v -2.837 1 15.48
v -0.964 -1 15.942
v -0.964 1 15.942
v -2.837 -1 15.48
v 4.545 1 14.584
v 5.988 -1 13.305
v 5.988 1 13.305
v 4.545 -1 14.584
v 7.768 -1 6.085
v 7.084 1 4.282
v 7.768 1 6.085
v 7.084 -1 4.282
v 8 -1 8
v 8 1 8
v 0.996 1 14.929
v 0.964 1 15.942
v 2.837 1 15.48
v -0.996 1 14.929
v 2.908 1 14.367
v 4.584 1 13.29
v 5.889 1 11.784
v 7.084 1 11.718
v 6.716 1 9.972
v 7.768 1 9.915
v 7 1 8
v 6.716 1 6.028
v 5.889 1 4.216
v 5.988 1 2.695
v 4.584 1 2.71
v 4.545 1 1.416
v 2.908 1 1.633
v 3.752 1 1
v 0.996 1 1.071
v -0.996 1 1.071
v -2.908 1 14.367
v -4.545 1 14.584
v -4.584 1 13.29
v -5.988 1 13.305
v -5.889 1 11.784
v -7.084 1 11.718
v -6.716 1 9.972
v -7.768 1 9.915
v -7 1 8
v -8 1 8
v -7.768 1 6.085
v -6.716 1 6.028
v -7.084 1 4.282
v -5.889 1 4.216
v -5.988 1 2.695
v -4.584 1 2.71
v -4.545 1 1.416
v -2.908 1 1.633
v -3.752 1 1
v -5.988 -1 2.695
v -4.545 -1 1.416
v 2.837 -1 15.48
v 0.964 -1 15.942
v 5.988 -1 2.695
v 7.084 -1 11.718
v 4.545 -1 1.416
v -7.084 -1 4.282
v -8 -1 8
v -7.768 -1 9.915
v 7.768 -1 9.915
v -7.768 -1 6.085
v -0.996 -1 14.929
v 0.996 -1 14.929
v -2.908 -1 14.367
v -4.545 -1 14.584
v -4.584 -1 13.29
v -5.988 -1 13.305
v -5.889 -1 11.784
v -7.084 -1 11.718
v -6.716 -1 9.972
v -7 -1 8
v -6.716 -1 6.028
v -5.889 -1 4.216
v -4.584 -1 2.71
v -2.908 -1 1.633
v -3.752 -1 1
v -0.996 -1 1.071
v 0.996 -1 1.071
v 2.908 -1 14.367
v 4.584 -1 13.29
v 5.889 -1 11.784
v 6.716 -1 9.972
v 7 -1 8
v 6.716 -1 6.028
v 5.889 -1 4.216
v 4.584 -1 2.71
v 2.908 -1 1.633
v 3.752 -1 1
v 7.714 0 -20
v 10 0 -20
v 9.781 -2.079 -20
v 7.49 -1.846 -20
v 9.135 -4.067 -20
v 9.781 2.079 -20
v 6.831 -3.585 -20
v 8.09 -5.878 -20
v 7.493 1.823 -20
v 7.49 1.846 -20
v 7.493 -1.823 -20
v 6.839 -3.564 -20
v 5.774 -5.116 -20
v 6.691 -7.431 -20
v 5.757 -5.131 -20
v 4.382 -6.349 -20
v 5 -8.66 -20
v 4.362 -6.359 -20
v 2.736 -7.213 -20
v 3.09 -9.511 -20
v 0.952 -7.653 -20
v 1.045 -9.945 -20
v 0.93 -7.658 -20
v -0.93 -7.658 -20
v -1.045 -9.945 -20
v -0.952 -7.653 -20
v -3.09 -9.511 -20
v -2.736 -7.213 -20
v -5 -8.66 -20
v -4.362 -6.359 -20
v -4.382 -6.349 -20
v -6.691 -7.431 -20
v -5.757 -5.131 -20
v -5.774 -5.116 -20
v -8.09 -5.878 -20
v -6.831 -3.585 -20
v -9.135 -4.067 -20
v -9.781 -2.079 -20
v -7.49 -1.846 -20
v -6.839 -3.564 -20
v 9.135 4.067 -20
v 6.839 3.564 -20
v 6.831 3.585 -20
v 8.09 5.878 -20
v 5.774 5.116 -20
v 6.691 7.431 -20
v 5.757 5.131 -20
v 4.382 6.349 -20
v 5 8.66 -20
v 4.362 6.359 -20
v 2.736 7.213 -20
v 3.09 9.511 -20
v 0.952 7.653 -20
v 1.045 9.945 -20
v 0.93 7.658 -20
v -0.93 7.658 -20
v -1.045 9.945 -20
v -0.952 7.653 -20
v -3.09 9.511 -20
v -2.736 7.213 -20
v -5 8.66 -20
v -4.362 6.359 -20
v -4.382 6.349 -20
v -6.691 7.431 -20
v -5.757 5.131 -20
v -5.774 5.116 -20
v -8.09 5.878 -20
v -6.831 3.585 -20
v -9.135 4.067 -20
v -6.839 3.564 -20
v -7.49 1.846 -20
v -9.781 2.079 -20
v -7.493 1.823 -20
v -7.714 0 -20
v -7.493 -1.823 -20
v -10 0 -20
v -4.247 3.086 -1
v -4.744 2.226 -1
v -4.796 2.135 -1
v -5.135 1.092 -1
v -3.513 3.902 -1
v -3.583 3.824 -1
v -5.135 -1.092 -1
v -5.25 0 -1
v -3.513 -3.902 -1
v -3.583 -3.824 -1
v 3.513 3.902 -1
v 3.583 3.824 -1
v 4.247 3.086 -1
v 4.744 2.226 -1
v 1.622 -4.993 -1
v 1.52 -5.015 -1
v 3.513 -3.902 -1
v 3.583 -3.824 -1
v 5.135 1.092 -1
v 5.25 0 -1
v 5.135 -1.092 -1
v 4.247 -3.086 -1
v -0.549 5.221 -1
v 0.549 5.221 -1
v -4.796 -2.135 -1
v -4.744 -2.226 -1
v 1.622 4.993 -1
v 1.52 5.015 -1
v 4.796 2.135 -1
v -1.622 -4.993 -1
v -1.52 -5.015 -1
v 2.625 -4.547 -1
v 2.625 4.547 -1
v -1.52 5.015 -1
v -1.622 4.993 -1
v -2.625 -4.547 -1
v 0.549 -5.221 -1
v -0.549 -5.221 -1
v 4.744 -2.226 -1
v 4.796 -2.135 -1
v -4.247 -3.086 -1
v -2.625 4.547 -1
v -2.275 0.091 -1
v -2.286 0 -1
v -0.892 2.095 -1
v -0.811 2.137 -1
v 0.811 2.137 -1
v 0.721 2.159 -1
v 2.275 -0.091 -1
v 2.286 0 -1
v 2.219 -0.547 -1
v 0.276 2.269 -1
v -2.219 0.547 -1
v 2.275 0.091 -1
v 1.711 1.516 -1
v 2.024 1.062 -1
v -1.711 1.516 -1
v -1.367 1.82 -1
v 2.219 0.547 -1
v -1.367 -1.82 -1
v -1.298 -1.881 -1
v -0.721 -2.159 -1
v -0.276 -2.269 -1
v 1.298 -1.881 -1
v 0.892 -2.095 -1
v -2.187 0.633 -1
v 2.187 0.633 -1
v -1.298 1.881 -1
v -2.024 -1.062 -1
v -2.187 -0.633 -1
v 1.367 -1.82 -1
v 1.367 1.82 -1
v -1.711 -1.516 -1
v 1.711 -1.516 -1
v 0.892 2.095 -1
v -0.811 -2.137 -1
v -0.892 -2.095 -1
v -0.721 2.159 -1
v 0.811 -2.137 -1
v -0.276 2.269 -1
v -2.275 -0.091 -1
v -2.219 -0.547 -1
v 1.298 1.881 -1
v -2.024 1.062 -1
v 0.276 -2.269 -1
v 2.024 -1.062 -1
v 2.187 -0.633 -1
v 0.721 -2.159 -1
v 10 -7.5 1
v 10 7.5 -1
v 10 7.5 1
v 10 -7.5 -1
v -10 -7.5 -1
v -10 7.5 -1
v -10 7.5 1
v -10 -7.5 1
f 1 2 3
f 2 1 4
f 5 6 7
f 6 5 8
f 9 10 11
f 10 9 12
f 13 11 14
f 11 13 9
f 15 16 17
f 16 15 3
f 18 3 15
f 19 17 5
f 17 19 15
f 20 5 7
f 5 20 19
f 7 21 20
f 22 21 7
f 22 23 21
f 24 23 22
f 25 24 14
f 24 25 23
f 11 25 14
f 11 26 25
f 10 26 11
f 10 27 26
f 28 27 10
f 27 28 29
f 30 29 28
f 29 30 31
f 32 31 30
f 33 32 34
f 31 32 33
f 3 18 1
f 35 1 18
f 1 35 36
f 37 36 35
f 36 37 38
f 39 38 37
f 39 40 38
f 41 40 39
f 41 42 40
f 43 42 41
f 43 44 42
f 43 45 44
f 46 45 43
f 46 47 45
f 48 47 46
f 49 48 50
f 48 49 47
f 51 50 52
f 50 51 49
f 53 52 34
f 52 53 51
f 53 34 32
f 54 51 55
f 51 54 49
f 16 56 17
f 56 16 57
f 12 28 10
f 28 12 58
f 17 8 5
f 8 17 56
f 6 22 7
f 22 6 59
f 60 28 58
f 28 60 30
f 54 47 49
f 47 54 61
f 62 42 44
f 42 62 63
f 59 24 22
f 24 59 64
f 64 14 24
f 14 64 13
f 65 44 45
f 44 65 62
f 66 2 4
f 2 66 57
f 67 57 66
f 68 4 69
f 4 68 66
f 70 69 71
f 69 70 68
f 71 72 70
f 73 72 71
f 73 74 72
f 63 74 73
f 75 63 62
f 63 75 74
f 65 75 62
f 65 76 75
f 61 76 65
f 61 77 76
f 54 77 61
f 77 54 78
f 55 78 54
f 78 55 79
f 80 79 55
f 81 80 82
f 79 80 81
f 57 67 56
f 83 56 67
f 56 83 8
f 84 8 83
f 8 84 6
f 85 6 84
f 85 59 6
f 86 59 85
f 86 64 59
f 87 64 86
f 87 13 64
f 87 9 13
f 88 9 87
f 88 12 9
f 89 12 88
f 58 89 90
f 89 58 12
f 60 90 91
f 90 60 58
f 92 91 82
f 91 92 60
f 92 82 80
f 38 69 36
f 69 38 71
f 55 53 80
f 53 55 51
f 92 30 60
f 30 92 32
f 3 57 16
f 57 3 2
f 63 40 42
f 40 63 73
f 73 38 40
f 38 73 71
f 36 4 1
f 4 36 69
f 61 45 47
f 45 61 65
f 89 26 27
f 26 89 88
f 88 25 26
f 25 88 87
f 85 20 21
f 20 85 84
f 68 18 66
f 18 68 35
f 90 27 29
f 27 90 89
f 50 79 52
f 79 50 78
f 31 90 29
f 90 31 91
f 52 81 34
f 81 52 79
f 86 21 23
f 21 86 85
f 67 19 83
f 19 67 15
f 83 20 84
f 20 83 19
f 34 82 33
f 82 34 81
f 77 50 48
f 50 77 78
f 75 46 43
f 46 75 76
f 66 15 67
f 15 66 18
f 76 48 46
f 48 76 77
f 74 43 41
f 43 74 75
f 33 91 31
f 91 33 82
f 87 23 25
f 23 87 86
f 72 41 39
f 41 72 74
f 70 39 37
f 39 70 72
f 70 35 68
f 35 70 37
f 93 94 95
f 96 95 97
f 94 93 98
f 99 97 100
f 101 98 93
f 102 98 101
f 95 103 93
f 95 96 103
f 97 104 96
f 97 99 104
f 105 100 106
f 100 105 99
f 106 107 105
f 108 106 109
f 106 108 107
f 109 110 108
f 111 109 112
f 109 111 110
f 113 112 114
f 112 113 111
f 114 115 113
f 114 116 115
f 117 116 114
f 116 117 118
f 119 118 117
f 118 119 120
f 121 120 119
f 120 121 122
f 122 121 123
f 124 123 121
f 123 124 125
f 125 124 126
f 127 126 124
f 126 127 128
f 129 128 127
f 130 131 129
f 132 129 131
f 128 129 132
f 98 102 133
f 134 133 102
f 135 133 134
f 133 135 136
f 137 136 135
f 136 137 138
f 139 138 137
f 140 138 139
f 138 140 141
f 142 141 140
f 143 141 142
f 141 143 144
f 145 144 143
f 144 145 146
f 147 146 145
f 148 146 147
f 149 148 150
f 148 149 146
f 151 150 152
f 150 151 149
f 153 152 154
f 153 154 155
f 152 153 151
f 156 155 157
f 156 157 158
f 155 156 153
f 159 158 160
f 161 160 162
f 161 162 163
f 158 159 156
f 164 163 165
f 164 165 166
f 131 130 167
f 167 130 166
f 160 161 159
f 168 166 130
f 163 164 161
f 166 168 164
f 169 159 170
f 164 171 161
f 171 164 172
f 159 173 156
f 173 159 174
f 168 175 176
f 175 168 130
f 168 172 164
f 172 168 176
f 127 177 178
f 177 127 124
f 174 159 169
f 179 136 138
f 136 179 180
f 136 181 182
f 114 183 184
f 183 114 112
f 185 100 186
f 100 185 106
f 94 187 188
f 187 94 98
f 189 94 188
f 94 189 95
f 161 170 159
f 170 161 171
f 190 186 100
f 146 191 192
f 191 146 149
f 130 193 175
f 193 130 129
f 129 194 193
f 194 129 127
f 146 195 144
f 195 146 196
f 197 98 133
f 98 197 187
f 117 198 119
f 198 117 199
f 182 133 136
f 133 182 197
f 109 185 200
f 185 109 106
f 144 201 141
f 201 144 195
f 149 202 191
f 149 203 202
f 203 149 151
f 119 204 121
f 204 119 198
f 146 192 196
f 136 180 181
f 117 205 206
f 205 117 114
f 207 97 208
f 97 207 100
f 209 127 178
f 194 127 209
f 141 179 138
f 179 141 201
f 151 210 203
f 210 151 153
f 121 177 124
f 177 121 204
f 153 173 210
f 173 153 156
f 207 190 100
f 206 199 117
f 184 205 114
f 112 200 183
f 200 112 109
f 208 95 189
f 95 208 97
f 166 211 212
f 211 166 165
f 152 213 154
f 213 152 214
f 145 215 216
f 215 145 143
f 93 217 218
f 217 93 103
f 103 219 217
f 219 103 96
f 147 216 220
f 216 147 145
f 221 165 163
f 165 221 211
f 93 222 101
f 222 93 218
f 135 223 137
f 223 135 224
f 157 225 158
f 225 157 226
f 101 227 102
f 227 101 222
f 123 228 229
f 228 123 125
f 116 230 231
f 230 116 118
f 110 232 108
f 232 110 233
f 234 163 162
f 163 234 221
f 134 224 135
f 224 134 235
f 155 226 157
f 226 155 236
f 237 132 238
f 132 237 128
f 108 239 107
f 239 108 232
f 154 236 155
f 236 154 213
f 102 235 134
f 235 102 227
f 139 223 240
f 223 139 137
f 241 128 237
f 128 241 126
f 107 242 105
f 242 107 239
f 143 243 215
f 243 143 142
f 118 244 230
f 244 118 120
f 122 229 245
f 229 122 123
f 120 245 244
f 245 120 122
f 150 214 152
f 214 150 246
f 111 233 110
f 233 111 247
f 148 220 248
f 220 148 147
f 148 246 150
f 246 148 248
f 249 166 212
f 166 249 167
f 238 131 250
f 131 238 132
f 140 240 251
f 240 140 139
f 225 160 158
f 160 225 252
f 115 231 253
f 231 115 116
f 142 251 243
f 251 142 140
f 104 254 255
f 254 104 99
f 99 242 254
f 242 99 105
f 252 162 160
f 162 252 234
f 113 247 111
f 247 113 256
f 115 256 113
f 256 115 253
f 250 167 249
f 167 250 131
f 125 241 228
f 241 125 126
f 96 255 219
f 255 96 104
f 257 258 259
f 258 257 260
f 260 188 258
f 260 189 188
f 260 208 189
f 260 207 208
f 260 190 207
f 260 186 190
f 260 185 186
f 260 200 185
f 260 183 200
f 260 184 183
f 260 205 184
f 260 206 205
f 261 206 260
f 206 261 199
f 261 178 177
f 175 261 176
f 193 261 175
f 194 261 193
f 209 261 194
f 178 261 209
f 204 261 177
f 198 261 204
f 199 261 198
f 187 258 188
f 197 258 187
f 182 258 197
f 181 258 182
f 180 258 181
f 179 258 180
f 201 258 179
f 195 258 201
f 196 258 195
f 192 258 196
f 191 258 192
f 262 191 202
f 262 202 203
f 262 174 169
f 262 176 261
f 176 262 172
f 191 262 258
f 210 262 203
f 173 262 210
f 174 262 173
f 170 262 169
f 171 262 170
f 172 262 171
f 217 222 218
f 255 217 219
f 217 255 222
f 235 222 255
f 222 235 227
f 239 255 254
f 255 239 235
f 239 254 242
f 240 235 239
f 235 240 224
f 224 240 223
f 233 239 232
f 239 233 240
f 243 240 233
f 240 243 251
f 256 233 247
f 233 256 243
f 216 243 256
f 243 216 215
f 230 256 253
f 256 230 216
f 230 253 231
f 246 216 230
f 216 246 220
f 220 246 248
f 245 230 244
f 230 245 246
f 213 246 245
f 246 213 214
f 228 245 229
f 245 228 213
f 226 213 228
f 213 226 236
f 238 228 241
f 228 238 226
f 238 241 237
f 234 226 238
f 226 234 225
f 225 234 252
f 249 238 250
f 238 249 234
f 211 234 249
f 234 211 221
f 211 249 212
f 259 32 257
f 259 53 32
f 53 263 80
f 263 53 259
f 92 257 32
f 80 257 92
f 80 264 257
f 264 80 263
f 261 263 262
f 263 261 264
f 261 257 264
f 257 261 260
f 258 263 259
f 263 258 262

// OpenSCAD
rotate([180,0,0]){
color("purple")
cube([20,15,2], center=true);

difference(){
	translate([0,0,-8])
	rotate([90,0,0]) cylinder(h=2, r=8, center=true);
	translate([0,0,-8])
	rotate([90,0,0]) cylinder(h=7, r=7, center=true);
}

difference(){
	cylinder(h=20, r1=5, r2=10);
	cylinder(h=21, r1=2, r2=8);
}
}
